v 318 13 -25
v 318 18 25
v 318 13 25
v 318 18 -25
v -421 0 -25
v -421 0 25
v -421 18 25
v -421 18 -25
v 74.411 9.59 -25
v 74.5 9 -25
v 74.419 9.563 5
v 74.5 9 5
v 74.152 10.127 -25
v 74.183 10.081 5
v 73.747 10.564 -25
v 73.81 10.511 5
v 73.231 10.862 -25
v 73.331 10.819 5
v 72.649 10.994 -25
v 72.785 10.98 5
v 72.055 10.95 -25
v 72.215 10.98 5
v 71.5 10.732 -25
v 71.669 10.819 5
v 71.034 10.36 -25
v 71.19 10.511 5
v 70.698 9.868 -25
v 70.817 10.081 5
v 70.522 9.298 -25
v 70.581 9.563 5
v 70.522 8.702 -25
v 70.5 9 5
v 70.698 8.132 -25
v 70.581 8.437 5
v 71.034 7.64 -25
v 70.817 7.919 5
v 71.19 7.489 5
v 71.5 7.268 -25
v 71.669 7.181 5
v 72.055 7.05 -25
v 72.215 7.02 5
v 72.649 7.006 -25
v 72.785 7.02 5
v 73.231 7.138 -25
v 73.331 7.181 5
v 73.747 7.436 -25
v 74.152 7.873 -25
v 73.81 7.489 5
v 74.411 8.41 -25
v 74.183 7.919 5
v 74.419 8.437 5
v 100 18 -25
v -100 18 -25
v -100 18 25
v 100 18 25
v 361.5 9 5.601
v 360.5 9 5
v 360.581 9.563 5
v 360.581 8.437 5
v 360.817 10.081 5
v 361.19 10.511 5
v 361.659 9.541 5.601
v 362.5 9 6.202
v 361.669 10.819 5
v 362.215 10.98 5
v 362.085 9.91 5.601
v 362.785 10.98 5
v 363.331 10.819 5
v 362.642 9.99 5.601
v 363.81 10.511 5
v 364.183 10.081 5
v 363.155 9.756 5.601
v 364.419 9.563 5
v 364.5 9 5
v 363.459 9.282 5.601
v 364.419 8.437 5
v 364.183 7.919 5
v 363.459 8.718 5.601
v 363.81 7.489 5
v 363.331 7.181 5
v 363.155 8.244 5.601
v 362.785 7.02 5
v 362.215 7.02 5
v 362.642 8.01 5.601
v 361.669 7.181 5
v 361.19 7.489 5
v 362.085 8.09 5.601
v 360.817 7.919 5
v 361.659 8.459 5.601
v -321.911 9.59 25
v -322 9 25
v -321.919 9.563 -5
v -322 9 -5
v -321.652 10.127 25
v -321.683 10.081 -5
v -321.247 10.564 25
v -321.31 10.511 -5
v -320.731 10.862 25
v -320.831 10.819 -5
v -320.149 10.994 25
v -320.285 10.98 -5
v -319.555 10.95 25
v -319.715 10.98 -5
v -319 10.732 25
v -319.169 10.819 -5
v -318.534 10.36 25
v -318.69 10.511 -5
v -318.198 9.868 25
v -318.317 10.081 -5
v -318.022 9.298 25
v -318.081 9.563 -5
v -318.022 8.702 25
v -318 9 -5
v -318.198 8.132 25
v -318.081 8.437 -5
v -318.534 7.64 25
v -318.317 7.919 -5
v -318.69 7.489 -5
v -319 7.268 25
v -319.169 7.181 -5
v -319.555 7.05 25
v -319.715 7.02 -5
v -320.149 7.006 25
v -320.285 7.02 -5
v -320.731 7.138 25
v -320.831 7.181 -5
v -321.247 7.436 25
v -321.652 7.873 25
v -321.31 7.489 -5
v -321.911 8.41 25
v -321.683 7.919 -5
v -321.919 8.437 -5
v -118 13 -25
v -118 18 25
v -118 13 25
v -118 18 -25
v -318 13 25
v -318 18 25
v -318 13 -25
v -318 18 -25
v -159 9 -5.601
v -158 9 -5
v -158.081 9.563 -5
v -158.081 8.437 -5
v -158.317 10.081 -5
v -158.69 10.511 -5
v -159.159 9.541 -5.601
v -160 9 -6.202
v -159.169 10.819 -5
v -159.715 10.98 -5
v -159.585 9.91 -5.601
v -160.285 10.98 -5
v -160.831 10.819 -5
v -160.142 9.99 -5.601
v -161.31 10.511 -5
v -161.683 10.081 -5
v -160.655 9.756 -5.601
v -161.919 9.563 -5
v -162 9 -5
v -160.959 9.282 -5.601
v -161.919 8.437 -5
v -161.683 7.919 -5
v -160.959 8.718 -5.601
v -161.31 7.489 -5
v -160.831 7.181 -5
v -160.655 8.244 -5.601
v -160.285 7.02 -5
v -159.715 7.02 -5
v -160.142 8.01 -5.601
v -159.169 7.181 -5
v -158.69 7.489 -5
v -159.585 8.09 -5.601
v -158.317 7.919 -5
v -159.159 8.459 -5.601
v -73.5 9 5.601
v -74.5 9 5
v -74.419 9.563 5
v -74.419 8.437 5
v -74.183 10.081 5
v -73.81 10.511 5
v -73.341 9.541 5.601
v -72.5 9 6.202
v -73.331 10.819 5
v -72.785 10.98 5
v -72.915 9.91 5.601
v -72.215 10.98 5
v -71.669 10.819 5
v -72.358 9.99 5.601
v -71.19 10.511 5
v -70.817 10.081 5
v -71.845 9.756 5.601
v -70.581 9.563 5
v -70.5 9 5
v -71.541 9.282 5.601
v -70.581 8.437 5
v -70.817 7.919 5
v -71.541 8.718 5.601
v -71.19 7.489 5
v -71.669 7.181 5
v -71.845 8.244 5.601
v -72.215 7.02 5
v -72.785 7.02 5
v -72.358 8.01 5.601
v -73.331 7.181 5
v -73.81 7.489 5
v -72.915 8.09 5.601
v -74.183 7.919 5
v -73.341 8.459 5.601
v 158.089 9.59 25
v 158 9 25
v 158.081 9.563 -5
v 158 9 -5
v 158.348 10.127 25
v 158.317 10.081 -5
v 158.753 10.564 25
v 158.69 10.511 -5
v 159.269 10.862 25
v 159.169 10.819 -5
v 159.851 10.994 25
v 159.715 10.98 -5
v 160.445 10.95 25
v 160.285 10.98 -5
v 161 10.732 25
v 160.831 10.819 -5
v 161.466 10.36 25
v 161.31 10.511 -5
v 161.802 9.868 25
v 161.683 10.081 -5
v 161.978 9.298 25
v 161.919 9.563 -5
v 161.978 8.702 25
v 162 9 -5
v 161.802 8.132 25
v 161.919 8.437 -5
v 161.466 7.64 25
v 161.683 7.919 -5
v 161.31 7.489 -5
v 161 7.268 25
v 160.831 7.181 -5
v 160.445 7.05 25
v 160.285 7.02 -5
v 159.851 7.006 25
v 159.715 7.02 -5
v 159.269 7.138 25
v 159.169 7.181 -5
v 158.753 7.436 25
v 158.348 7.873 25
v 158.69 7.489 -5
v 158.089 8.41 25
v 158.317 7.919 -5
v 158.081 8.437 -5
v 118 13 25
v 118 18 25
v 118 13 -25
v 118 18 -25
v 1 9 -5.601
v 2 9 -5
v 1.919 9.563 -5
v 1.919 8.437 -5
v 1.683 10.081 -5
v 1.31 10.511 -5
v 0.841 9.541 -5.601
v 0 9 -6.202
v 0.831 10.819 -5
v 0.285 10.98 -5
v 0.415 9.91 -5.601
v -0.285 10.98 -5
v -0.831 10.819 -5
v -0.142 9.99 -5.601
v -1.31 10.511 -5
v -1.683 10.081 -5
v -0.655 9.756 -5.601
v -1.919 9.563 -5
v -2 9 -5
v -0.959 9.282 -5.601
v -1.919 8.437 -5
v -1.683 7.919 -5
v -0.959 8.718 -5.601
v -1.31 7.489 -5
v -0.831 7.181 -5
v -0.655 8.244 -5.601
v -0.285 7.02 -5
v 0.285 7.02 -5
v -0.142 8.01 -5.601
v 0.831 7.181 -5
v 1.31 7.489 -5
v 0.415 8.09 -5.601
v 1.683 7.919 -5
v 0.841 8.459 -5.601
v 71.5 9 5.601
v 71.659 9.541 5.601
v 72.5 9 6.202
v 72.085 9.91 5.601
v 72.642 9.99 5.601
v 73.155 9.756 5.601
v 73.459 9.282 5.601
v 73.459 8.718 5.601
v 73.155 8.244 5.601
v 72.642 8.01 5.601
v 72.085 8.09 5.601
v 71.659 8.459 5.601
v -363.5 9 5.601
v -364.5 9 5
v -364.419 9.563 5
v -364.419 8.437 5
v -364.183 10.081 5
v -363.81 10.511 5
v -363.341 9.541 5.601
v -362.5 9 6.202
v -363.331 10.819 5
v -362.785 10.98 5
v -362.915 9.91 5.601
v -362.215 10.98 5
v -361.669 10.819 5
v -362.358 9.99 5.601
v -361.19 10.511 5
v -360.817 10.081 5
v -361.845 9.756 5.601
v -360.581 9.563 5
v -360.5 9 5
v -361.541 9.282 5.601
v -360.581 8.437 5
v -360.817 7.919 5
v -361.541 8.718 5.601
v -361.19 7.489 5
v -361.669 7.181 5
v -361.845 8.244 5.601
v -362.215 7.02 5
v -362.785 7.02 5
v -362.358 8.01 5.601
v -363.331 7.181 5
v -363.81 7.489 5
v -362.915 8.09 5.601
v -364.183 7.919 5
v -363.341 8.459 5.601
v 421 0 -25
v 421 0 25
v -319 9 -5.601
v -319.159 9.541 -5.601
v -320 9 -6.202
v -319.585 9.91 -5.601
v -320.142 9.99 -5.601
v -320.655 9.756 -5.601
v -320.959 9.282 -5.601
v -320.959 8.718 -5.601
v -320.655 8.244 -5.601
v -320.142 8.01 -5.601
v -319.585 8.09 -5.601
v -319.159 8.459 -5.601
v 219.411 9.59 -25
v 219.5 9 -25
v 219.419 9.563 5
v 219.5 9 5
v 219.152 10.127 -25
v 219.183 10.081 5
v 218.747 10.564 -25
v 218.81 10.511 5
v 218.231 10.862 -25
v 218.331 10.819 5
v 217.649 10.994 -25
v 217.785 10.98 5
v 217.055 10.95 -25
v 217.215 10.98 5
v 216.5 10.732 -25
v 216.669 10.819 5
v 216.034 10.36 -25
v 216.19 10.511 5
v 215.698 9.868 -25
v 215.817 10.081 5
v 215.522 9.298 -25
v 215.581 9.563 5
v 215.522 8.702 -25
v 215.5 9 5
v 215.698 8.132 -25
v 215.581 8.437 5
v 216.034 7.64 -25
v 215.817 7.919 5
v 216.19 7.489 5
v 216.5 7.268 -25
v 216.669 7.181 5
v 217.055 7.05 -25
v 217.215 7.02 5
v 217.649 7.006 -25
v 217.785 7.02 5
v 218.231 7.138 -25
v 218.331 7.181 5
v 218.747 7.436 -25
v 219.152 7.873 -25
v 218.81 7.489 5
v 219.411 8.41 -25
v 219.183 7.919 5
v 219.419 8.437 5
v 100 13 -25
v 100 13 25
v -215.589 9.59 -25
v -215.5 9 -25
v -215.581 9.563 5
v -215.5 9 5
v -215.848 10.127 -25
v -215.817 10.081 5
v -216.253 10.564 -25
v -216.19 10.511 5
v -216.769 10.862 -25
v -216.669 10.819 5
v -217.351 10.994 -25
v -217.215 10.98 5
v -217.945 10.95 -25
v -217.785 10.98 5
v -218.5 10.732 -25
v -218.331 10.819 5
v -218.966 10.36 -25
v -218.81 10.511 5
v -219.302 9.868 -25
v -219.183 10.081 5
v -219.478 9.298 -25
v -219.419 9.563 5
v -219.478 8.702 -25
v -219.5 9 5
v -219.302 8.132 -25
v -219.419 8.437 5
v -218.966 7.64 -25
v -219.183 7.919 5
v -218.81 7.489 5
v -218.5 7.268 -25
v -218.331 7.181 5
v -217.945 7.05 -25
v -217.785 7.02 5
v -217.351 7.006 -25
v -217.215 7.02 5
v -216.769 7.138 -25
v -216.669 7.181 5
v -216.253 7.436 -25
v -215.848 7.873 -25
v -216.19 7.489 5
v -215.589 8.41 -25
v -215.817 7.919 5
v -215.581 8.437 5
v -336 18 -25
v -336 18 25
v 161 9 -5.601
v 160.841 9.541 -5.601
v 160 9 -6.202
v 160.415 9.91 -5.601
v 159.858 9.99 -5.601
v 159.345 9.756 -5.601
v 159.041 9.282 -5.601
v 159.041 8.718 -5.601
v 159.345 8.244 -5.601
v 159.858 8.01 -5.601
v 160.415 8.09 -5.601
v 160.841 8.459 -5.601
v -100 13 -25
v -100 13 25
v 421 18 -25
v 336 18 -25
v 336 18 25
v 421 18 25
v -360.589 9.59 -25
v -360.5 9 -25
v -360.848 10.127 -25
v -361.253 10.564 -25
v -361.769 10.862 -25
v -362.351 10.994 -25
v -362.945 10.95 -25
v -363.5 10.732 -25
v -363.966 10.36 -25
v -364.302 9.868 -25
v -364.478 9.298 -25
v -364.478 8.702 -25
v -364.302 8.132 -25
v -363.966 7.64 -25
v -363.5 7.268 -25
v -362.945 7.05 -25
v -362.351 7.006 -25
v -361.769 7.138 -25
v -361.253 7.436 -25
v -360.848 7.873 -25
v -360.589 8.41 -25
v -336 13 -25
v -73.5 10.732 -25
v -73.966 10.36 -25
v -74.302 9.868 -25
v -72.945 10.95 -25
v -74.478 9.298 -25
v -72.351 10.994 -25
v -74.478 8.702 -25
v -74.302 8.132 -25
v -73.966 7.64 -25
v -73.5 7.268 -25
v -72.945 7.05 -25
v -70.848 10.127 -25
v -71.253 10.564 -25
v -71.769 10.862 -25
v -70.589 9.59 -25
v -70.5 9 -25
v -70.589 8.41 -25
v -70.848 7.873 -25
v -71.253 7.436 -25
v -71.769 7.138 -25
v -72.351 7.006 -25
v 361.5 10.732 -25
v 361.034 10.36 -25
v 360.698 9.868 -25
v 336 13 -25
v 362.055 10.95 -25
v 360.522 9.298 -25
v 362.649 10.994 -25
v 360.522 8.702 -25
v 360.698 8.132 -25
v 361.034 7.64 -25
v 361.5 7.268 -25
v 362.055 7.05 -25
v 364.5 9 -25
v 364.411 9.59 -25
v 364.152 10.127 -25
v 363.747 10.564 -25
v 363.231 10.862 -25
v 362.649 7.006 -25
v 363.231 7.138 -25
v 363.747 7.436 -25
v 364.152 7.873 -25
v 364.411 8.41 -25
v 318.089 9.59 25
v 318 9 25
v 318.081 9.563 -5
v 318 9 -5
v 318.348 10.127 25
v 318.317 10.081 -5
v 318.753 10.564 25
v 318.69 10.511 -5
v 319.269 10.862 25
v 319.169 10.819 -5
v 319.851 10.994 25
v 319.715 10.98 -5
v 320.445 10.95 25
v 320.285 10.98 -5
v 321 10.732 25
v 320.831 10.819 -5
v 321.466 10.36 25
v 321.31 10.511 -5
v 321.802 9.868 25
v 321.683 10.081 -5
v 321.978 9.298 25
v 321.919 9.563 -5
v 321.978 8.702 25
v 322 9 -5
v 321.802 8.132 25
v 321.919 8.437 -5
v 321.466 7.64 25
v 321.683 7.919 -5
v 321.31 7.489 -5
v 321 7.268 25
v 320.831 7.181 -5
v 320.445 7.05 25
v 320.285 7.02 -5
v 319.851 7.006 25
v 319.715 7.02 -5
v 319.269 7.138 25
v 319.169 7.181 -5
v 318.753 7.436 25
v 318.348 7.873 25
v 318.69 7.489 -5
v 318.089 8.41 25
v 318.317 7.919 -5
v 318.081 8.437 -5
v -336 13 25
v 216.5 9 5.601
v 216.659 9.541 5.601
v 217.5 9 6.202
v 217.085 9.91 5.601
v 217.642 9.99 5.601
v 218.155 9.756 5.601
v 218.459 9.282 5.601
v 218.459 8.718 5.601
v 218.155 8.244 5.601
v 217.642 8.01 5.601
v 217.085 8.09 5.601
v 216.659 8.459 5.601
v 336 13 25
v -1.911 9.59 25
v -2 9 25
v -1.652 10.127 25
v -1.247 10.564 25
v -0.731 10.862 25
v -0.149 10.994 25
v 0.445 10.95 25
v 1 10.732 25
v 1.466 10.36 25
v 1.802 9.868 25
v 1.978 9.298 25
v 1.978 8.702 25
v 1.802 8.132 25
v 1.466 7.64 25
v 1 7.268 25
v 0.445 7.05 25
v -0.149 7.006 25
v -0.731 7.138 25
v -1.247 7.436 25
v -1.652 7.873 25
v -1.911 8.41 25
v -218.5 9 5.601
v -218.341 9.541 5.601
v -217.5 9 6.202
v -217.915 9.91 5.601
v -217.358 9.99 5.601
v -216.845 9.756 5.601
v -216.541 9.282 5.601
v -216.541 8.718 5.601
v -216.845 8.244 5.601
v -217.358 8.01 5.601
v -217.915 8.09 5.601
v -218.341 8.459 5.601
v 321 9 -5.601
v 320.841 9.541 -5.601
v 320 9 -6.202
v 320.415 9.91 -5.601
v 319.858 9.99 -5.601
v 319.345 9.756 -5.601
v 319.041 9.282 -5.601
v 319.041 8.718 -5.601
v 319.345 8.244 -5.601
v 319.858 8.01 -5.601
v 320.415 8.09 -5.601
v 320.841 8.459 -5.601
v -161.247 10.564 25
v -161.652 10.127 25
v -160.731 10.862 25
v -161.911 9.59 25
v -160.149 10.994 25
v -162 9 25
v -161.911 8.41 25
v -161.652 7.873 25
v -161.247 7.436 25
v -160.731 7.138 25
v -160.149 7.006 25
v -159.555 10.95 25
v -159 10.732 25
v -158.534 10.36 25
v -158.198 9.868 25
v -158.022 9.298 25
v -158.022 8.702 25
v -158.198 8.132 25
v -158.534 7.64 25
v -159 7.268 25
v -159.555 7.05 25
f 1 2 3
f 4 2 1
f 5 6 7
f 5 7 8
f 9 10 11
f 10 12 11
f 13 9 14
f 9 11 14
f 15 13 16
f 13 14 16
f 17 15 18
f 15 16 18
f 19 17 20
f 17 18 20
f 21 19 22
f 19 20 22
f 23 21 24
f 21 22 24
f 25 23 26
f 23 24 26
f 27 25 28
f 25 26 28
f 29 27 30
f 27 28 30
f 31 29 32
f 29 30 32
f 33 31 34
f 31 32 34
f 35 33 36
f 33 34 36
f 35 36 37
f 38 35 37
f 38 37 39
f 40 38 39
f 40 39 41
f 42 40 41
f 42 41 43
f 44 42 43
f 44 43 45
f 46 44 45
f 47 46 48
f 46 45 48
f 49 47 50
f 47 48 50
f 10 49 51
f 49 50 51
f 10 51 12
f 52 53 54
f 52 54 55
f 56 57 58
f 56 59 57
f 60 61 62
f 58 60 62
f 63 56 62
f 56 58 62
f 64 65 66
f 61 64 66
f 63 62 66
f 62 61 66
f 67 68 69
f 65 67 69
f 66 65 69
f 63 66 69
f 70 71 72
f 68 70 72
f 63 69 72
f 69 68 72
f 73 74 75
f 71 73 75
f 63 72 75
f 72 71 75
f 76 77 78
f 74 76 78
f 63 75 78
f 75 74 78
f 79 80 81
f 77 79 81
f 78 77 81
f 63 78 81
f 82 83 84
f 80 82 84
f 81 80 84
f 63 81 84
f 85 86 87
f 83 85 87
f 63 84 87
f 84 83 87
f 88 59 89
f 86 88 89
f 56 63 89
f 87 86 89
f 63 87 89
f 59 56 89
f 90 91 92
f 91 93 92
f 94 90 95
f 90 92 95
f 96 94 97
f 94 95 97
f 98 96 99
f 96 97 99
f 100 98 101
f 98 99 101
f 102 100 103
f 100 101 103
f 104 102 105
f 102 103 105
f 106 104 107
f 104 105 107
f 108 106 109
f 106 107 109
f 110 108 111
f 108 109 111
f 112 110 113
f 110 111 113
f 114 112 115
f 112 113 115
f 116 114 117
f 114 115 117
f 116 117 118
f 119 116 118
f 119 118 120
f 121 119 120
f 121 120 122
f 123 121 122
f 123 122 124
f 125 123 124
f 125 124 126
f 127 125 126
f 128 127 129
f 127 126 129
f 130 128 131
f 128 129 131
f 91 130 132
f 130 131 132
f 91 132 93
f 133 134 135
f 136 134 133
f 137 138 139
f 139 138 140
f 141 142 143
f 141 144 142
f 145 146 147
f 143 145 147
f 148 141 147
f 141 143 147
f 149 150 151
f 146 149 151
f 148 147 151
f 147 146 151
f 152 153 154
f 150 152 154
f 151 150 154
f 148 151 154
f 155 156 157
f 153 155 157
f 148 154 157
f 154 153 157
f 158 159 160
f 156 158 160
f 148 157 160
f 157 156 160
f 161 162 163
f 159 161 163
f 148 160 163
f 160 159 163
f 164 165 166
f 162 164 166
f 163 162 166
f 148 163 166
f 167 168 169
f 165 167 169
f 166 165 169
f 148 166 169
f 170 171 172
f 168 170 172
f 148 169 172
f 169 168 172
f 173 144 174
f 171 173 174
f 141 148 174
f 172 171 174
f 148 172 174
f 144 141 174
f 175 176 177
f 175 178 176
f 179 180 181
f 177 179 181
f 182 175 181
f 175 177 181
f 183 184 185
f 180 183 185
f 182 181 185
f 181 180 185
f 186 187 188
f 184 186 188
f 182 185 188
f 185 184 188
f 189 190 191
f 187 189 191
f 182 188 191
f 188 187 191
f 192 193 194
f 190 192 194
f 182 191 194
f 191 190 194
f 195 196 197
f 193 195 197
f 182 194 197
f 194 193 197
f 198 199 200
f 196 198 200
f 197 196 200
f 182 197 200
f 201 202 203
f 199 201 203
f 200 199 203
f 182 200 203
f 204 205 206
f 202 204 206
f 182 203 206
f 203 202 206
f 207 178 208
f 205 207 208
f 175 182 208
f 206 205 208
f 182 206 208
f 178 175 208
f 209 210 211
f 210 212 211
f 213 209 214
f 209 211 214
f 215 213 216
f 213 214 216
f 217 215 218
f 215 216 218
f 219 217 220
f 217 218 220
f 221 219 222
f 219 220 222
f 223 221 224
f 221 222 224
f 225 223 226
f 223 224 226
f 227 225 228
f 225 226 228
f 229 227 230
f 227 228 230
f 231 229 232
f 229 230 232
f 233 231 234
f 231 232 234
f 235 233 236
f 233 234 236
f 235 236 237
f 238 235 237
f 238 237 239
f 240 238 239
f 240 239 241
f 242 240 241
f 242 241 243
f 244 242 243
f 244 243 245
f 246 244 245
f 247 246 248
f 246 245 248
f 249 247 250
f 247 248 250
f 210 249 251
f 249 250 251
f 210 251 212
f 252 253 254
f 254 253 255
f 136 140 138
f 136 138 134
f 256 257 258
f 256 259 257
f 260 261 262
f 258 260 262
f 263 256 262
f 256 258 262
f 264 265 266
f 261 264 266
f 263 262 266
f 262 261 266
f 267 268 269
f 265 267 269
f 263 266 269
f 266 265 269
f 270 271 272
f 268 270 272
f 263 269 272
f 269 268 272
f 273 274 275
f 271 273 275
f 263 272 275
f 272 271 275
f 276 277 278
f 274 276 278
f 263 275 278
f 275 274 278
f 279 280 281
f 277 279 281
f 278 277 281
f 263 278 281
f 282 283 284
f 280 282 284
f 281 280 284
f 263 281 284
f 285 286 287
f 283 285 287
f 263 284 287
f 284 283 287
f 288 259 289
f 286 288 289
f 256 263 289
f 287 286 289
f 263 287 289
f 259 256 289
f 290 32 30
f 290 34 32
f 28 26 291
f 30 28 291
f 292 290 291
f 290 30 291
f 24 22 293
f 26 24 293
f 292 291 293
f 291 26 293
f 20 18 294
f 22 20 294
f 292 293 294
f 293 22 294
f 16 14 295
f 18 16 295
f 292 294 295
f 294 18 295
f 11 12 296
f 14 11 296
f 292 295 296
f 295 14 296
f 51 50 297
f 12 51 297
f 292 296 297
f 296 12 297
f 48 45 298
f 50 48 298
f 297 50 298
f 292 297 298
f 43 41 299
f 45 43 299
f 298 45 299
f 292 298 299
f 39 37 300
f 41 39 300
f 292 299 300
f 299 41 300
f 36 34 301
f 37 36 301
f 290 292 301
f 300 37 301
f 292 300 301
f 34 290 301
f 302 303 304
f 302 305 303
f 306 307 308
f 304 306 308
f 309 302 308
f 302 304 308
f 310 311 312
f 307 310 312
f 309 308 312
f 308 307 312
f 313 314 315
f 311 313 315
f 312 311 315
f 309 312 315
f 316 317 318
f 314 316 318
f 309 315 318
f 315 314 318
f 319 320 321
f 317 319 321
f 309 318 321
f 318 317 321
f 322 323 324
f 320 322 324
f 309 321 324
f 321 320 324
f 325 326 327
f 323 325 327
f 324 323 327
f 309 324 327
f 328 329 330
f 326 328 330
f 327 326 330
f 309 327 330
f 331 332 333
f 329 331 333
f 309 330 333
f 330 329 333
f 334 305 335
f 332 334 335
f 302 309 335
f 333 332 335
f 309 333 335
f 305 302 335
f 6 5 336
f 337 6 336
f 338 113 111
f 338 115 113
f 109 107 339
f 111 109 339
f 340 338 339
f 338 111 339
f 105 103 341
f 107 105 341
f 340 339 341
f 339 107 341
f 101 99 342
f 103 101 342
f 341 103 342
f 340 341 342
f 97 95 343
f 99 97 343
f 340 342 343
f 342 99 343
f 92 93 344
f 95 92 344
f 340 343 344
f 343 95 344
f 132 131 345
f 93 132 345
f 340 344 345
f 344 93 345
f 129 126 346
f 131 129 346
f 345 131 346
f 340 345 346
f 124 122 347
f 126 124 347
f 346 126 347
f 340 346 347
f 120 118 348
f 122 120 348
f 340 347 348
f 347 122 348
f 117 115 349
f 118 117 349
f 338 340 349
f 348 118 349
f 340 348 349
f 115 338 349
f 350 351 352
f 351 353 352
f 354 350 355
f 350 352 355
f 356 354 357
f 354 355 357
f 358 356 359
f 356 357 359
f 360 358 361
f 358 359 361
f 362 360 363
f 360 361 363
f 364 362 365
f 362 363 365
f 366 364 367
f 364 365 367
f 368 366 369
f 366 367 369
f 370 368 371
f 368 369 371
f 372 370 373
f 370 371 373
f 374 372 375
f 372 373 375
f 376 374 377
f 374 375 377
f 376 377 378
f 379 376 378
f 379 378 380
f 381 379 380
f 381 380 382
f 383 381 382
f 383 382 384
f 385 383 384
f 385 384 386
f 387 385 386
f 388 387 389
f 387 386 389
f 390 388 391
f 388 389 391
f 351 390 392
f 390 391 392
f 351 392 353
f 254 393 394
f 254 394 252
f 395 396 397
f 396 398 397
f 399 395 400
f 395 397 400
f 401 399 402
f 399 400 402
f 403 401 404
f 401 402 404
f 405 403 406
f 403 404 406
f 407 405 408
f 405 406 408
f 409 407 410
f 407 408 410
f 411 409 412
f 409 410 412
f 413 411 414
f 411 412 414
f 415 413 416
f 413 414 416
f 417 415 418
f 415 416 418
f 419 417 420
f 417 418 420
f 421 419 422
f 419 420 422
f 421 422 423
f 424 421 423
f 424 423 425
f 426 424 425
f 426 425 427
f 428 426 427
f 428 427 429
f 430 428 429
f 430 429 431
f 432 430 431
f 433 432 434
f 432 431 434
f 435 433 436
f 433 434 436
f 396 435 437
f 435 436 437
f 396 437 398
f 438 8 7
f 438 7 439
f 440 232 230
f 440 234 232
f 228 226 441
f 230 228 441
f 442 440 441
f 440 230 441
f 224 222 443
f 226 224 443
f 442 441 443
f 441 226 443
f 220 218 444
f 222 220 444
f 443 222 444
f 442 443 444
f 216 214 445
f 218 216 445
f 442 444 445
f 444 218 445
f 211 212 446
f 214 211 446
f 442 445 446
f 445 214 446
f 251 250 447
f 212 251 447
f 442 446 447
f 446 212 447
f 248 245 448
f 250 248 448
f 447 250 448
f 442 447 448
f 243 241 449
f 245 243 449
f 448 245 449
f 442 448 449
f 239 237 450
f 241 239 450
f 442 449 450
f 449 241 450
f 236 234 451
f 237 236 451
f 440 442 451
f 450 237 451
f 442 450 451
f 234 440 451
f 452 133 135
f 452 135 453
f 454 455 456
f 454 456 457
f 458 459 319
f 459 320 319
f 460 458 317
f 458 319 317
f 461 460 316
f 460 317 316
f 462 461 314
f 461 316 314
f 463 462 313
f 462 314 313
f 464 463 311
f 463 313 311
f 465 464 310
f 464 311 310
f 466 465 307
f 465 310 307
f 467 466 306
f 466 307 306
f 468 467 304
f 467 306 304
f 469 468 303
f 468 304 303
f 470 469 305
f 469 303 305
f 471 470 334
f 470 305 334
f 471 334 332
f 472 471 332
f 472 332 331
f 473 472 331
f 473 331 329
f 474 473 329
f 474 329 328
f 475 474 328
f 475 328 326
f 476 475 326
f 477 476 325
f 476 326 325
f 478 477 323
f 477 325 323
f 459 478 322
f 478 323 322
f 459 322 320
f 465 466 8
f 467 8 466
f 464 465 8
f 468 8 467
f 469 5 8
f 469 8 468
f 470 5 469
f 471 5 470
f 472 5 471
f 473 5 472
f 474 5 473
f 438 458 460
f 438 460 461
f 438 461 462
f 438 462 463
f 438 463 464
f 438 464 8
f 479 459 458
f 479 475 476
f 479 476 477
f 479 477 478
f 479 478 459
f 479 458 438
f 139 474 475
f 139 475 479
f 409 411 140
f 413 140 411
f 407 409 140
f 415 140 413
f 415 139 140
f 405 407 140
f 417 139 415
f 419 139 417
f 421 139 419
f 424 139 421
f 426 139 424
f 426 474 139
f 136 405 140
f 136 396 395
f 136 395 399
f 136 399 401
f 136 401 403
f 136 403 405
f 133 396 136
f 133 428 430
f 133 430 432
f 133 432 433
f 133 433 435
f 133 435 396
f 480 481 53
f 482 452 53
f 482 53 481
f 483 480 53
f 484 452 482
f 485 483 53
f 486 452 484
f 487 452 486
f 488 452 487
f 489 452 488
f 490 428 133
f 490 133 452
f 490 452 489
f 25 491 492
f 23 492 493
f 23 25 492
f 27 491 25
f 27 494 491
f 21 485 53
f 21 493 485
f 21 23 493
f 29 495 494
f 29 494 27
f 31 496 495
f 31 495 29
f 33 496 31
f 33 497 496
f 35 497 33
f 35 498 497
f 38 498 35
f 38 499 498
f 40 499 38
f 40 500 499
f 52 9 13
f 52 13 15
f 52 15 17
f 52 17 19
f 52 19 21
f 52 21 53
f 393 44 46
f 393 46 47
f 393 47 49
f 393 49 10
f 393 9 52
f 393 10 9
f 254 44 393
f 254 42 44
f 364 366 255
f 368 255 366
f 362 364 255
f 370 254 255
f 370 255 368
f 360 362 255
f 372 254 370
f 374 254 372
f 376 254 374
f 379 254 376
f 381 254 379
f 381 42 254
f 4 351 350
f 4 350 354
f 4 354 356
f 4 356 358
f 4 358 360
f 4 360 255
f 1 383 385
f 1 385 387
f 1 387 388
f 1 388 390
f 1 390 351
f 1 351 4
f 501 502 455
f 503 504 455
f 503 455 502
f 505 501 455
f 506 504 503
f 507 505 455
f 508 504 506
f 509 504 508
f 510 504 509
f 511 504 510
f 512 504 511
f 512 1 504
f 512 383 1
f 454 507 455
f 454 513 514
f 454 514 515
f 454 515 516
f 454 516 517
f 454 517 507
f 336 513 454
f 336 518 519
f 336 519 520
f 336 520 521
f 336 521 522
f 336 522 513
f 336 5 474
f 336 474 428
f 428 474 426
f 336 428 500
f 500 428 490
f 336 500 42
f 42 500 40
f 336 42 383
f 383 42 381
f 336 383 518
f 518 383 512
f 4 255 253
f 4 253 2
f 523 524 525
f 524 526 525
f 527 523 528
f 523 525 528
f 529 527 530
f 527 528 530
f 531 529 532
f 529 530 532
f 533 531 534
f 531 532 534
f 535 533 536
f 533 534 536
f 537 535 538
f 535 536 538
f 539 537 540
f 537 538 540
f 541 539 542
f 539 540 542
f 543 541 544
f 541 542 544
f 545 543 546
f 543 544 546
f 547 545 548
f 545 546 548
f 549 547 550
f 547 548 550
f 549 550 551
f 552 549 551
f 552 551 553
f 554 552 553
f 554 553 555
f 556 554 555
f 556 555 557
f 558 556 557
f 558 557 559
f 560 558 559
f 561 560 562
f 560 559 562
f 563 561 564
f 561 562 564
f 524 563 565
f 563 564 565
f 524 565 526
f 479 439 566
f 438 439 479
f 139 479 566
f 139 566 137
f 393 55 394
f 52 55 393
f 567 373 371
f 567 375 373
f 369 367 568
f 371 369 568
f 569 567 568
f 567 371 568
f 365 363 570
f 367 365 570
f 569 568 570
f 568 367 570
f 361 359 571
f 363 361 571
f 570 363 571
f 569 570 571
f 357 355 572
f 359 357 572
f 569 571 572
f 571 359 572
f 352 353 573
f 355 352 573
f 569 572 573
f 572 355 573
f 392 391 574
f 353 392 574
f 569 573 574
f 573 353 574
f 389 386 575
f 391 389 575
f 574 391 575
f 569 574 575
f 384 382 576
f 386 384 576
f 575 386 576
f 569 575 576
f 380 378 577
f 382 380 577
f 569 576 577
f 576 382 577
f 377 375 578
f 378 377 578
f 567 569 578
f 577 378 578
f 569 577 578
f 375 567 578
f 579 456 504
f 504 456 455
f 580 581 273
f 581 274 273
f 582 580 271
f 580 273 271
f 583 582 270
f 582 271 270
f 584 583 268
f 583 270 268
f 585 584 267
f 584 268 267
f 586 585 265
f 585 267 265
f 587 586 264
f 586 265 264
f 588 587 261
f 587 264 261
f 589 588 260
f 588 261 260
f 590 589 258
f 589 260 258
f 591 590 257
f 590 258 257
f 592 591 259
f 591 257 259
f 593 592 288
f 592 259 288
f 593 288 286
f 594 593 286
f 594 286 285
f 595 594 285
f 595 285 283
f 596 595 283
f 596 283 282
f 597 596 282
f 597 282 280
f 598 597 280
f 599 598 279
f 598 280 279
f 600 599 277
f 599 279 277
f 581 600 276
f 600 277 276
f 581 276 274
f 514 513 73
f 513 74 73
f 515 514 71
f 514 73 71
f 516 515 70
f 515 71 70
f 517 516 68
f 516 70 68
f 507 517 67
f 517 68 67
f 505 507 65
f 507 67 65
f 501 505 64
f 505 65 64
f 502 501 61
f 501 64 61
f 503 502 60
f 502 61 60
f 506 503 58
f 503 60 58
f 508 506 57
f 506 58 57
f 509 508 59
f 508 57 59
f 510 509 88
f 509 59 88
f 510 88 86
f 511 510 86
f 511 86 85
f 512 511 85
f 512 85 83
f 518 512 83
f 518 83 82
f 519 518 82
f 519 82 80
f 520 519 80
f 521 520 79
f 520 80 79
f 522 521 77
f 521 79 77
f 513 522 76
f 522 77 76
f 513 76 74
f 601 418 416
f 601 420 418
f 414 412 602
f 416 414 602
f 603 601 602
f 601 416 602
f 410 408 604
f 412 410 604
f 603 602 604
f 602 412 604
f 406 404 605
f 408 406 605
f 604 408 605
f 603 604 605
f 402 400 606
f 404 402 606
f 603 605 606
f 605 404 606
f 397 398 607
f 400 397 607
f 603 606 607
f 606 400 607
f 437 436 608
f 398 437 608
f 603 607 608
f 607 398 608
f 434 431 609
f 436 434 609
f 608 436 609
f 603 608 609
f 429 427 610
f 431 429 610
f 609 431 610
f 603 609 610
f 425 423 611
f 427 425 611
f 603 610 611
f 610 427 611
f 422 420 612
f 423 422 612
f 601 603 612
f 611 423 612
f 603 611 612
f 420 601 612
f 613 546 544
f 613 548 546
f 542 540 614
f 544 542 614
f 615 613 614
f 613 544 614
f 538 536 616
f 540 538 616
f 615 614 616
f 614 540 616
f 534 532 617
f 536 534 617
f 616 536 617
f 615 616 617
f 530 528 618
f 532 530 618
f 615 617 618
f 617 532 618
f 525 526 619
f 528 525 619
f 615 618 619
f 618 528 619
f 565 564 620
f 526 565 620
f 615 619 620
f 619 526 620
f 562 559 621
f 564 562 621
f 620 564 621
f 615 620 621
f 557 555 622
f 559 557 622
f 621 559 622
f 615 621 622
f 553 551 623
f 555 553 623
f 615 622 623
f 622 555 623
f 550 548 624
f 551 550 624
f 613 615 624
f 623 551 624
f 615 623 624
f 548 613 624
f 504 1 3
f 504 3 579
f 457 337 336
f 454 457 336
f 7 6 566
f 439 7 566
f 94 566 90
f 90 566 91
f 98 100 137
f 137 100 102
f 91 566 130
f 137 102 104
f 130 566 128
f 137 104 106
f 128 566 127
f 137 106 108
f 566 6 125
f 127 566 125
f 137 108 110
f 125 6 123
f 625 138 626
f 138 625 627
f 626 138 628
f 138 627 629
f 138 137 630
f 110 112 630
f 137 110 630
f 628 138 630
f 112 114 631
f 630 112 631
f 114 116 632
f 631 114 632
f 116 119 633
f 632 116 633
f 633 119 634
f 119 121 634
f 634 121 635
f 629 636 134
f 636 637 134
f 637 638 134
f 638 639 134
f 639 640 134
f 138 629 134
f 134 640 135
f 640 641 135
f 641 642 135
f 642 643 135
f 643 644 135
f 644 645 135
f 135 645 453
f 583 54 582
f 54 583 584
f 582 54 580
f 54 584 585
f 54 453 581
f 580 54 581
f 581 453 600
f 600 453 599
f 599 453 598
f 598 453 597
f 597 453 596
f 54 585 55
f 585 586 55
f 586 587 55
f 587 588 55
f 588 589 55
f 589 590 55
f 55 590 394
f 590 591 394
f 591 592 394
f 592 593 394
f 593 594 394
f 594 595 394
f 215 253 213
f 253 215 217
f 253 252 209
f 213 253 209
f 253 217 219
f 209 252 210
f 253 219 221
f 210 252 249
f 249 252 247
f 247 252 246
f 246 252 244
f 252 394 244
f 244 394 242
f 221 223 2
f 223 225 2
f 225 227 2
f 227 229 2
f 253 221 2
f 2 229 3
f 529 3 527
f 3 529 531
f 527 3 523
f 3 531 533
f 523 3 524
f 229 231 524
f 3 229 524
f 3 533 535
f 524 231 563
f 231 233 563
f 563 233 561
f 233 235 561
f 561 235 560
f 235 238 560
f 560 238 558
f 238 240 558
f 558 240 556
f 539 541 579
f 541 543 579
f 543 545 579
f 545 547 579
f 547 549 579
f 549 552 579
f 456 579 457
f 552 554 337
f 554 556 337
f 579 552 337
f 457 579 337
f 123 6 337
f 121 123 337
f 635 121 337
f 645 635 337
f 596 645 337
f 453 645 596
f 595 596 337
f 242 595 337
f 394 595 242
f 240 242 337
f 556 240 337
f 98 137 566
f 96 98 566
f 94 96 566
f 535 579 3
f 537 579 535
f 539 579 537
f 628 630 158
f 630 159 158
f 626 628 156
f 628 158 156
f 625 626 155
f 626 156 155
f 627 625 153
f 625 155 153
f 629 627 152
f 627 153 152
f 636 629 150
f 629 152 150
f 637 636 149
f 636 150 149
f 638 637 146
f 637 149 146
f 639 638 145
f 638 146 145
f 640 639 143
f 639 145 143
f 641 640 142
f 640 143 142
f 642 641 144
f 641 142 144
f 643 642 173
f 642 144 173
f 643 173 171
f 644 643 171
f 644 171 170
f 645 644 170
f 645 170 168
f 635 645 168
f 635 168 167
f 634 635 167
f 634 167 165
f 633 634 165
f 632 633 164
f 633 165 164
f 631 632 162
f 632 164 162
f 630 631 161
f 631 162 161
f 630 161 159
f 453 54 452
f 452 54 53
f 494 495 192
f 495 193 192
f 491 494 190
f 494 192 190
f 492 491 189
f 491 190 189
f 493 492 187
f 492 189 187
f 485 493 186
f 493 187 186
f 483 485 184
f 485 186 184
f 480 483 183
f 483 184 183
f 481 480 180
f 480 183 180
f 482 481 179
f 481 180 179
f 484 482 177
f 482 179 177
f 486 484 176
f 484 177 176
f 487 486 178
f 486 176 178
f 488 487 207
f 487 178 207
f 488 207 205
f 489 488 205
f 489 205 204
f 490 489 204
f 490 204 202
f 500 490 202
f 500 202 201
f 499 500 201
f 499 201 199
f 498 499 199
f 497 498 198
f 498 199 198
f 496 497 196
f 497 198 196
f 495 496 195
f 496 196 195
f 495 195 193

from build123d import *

# Parameters (mm, degrees)
SKETCH1_W                    = 842
SKETCH1_H                    = 50
BOSS_EXTRUDE1_DEPTH          = 18
SKETCH2_W                    = 18
SKETCH2_H                    = 234.314907891
CUT_EXTRUDE1_DEPTH           = 5
F_4_0_4_DIAMETER_HOLE1_D     = 4
F_4_0_4_DIAMETER_HOLE1_DEPTH = 30
F_4_0_4_DIAMETER_HOLE1_TIP   = 1.201721238
F_4_0_4_DIAMETER_HOLE2_D     = 4
F_4_0_4_DIAMETER_HOLE2_DEPTH = 30
F_4_0_4_DIAMETER_HOLE2_TIP   = 1.201721238


with BuildPart() as part:
    # Sketch1 → Boss-Extrude1 (new body)
    with BuildSketch(Plane(origin=(0, 0, 0), x_dir=(1, 0, 0), z_dir=(0, 1, 0))):
        Rectangle(SKETCH1_W, SKETCH1_H)
    extrude(amount=BOSS_EXTRUDE1_DEPTH)

    # Sketch2 → Cut-Extrude1 (cut)
    with BuildSketch(Plane(origin=(0, 18, 0), x_dir=(1, 0, 0), z_dir=(0, 1, 0))):
        with Locations((-327, 12.382649644)):
            Rectangle(SKETCH2_W, SKETCH2_H)
        with Locations((-109, 12.382649644)):
            Rectangle(SKETCH2_W, SKETCH2_H)
        with Locations((109, 12.382649644)):
            Rectangle(SKETCH2_W, SKETCH2_H)
        with Locations((327, 12.382649644)):
            Rectangle(SKETCH2_W, SKETCH2_H)
    extrude(amount=-CUT_EXTRUDE1_DEPTH, mode=Mode.SUBTRACT)

    # Ø4.0 (4) Diameter Hole1
    with Locations(Plane.XY.offset(25)):
        with Locations((-320, 9), (-160, 9), (0, 9), (160, 9), (320, 9)):
            Hole(F_4_0_4_DIAMETER_HOLE1_D / 2, depth=F_4_0_4_DIAMETER_HOLE1_DEPTH)
            with Locations((0, 0, -(F_4_0_4_DIAMETER_HOLE1_DEPTH + F_4_0_4_DIAMETER_HOLE1_TIP / 2))):  # 118° drill point
                Cone(0, F_4_0_4_DIAMETER_HOLE1_D / 2, F_4_0_4_DIAMETER_HOLE1_TIP, mode=Mode.SUBTRACT)

    # Ø4.0 (4) Diameter Hole2
    with Locations(Plane(origin=(0, 0, -25), x_dir=(-1, 0, 0), z_dir=(0, 0, -1))):
        with Locations((-362.5, 9), (-217.5, 9), (-72.5, 9), (72.5, 9), (217.5, 9), (362.5, 9)):
            Hole(F_4_0_4_DIAMETER_HOLE2_D / 2, depth=F_4_0_4_DIAMETER_HOLE2_DEPTH)
            with Locations((0, 0, -(F_4_0_4_DIAMETER_HOLE2_DEPTH + F_4_0_4_DIAMETER_HOLE2_TIP / 2))):  # 118° drill point
                Cone(0, F_4_0_4_DIAMETER_HOLE2_D / 2, F_4_0_4_DIAMETER_HOLE2_TIP, mode=Mode.SUBTRACT)


solid = part.part
